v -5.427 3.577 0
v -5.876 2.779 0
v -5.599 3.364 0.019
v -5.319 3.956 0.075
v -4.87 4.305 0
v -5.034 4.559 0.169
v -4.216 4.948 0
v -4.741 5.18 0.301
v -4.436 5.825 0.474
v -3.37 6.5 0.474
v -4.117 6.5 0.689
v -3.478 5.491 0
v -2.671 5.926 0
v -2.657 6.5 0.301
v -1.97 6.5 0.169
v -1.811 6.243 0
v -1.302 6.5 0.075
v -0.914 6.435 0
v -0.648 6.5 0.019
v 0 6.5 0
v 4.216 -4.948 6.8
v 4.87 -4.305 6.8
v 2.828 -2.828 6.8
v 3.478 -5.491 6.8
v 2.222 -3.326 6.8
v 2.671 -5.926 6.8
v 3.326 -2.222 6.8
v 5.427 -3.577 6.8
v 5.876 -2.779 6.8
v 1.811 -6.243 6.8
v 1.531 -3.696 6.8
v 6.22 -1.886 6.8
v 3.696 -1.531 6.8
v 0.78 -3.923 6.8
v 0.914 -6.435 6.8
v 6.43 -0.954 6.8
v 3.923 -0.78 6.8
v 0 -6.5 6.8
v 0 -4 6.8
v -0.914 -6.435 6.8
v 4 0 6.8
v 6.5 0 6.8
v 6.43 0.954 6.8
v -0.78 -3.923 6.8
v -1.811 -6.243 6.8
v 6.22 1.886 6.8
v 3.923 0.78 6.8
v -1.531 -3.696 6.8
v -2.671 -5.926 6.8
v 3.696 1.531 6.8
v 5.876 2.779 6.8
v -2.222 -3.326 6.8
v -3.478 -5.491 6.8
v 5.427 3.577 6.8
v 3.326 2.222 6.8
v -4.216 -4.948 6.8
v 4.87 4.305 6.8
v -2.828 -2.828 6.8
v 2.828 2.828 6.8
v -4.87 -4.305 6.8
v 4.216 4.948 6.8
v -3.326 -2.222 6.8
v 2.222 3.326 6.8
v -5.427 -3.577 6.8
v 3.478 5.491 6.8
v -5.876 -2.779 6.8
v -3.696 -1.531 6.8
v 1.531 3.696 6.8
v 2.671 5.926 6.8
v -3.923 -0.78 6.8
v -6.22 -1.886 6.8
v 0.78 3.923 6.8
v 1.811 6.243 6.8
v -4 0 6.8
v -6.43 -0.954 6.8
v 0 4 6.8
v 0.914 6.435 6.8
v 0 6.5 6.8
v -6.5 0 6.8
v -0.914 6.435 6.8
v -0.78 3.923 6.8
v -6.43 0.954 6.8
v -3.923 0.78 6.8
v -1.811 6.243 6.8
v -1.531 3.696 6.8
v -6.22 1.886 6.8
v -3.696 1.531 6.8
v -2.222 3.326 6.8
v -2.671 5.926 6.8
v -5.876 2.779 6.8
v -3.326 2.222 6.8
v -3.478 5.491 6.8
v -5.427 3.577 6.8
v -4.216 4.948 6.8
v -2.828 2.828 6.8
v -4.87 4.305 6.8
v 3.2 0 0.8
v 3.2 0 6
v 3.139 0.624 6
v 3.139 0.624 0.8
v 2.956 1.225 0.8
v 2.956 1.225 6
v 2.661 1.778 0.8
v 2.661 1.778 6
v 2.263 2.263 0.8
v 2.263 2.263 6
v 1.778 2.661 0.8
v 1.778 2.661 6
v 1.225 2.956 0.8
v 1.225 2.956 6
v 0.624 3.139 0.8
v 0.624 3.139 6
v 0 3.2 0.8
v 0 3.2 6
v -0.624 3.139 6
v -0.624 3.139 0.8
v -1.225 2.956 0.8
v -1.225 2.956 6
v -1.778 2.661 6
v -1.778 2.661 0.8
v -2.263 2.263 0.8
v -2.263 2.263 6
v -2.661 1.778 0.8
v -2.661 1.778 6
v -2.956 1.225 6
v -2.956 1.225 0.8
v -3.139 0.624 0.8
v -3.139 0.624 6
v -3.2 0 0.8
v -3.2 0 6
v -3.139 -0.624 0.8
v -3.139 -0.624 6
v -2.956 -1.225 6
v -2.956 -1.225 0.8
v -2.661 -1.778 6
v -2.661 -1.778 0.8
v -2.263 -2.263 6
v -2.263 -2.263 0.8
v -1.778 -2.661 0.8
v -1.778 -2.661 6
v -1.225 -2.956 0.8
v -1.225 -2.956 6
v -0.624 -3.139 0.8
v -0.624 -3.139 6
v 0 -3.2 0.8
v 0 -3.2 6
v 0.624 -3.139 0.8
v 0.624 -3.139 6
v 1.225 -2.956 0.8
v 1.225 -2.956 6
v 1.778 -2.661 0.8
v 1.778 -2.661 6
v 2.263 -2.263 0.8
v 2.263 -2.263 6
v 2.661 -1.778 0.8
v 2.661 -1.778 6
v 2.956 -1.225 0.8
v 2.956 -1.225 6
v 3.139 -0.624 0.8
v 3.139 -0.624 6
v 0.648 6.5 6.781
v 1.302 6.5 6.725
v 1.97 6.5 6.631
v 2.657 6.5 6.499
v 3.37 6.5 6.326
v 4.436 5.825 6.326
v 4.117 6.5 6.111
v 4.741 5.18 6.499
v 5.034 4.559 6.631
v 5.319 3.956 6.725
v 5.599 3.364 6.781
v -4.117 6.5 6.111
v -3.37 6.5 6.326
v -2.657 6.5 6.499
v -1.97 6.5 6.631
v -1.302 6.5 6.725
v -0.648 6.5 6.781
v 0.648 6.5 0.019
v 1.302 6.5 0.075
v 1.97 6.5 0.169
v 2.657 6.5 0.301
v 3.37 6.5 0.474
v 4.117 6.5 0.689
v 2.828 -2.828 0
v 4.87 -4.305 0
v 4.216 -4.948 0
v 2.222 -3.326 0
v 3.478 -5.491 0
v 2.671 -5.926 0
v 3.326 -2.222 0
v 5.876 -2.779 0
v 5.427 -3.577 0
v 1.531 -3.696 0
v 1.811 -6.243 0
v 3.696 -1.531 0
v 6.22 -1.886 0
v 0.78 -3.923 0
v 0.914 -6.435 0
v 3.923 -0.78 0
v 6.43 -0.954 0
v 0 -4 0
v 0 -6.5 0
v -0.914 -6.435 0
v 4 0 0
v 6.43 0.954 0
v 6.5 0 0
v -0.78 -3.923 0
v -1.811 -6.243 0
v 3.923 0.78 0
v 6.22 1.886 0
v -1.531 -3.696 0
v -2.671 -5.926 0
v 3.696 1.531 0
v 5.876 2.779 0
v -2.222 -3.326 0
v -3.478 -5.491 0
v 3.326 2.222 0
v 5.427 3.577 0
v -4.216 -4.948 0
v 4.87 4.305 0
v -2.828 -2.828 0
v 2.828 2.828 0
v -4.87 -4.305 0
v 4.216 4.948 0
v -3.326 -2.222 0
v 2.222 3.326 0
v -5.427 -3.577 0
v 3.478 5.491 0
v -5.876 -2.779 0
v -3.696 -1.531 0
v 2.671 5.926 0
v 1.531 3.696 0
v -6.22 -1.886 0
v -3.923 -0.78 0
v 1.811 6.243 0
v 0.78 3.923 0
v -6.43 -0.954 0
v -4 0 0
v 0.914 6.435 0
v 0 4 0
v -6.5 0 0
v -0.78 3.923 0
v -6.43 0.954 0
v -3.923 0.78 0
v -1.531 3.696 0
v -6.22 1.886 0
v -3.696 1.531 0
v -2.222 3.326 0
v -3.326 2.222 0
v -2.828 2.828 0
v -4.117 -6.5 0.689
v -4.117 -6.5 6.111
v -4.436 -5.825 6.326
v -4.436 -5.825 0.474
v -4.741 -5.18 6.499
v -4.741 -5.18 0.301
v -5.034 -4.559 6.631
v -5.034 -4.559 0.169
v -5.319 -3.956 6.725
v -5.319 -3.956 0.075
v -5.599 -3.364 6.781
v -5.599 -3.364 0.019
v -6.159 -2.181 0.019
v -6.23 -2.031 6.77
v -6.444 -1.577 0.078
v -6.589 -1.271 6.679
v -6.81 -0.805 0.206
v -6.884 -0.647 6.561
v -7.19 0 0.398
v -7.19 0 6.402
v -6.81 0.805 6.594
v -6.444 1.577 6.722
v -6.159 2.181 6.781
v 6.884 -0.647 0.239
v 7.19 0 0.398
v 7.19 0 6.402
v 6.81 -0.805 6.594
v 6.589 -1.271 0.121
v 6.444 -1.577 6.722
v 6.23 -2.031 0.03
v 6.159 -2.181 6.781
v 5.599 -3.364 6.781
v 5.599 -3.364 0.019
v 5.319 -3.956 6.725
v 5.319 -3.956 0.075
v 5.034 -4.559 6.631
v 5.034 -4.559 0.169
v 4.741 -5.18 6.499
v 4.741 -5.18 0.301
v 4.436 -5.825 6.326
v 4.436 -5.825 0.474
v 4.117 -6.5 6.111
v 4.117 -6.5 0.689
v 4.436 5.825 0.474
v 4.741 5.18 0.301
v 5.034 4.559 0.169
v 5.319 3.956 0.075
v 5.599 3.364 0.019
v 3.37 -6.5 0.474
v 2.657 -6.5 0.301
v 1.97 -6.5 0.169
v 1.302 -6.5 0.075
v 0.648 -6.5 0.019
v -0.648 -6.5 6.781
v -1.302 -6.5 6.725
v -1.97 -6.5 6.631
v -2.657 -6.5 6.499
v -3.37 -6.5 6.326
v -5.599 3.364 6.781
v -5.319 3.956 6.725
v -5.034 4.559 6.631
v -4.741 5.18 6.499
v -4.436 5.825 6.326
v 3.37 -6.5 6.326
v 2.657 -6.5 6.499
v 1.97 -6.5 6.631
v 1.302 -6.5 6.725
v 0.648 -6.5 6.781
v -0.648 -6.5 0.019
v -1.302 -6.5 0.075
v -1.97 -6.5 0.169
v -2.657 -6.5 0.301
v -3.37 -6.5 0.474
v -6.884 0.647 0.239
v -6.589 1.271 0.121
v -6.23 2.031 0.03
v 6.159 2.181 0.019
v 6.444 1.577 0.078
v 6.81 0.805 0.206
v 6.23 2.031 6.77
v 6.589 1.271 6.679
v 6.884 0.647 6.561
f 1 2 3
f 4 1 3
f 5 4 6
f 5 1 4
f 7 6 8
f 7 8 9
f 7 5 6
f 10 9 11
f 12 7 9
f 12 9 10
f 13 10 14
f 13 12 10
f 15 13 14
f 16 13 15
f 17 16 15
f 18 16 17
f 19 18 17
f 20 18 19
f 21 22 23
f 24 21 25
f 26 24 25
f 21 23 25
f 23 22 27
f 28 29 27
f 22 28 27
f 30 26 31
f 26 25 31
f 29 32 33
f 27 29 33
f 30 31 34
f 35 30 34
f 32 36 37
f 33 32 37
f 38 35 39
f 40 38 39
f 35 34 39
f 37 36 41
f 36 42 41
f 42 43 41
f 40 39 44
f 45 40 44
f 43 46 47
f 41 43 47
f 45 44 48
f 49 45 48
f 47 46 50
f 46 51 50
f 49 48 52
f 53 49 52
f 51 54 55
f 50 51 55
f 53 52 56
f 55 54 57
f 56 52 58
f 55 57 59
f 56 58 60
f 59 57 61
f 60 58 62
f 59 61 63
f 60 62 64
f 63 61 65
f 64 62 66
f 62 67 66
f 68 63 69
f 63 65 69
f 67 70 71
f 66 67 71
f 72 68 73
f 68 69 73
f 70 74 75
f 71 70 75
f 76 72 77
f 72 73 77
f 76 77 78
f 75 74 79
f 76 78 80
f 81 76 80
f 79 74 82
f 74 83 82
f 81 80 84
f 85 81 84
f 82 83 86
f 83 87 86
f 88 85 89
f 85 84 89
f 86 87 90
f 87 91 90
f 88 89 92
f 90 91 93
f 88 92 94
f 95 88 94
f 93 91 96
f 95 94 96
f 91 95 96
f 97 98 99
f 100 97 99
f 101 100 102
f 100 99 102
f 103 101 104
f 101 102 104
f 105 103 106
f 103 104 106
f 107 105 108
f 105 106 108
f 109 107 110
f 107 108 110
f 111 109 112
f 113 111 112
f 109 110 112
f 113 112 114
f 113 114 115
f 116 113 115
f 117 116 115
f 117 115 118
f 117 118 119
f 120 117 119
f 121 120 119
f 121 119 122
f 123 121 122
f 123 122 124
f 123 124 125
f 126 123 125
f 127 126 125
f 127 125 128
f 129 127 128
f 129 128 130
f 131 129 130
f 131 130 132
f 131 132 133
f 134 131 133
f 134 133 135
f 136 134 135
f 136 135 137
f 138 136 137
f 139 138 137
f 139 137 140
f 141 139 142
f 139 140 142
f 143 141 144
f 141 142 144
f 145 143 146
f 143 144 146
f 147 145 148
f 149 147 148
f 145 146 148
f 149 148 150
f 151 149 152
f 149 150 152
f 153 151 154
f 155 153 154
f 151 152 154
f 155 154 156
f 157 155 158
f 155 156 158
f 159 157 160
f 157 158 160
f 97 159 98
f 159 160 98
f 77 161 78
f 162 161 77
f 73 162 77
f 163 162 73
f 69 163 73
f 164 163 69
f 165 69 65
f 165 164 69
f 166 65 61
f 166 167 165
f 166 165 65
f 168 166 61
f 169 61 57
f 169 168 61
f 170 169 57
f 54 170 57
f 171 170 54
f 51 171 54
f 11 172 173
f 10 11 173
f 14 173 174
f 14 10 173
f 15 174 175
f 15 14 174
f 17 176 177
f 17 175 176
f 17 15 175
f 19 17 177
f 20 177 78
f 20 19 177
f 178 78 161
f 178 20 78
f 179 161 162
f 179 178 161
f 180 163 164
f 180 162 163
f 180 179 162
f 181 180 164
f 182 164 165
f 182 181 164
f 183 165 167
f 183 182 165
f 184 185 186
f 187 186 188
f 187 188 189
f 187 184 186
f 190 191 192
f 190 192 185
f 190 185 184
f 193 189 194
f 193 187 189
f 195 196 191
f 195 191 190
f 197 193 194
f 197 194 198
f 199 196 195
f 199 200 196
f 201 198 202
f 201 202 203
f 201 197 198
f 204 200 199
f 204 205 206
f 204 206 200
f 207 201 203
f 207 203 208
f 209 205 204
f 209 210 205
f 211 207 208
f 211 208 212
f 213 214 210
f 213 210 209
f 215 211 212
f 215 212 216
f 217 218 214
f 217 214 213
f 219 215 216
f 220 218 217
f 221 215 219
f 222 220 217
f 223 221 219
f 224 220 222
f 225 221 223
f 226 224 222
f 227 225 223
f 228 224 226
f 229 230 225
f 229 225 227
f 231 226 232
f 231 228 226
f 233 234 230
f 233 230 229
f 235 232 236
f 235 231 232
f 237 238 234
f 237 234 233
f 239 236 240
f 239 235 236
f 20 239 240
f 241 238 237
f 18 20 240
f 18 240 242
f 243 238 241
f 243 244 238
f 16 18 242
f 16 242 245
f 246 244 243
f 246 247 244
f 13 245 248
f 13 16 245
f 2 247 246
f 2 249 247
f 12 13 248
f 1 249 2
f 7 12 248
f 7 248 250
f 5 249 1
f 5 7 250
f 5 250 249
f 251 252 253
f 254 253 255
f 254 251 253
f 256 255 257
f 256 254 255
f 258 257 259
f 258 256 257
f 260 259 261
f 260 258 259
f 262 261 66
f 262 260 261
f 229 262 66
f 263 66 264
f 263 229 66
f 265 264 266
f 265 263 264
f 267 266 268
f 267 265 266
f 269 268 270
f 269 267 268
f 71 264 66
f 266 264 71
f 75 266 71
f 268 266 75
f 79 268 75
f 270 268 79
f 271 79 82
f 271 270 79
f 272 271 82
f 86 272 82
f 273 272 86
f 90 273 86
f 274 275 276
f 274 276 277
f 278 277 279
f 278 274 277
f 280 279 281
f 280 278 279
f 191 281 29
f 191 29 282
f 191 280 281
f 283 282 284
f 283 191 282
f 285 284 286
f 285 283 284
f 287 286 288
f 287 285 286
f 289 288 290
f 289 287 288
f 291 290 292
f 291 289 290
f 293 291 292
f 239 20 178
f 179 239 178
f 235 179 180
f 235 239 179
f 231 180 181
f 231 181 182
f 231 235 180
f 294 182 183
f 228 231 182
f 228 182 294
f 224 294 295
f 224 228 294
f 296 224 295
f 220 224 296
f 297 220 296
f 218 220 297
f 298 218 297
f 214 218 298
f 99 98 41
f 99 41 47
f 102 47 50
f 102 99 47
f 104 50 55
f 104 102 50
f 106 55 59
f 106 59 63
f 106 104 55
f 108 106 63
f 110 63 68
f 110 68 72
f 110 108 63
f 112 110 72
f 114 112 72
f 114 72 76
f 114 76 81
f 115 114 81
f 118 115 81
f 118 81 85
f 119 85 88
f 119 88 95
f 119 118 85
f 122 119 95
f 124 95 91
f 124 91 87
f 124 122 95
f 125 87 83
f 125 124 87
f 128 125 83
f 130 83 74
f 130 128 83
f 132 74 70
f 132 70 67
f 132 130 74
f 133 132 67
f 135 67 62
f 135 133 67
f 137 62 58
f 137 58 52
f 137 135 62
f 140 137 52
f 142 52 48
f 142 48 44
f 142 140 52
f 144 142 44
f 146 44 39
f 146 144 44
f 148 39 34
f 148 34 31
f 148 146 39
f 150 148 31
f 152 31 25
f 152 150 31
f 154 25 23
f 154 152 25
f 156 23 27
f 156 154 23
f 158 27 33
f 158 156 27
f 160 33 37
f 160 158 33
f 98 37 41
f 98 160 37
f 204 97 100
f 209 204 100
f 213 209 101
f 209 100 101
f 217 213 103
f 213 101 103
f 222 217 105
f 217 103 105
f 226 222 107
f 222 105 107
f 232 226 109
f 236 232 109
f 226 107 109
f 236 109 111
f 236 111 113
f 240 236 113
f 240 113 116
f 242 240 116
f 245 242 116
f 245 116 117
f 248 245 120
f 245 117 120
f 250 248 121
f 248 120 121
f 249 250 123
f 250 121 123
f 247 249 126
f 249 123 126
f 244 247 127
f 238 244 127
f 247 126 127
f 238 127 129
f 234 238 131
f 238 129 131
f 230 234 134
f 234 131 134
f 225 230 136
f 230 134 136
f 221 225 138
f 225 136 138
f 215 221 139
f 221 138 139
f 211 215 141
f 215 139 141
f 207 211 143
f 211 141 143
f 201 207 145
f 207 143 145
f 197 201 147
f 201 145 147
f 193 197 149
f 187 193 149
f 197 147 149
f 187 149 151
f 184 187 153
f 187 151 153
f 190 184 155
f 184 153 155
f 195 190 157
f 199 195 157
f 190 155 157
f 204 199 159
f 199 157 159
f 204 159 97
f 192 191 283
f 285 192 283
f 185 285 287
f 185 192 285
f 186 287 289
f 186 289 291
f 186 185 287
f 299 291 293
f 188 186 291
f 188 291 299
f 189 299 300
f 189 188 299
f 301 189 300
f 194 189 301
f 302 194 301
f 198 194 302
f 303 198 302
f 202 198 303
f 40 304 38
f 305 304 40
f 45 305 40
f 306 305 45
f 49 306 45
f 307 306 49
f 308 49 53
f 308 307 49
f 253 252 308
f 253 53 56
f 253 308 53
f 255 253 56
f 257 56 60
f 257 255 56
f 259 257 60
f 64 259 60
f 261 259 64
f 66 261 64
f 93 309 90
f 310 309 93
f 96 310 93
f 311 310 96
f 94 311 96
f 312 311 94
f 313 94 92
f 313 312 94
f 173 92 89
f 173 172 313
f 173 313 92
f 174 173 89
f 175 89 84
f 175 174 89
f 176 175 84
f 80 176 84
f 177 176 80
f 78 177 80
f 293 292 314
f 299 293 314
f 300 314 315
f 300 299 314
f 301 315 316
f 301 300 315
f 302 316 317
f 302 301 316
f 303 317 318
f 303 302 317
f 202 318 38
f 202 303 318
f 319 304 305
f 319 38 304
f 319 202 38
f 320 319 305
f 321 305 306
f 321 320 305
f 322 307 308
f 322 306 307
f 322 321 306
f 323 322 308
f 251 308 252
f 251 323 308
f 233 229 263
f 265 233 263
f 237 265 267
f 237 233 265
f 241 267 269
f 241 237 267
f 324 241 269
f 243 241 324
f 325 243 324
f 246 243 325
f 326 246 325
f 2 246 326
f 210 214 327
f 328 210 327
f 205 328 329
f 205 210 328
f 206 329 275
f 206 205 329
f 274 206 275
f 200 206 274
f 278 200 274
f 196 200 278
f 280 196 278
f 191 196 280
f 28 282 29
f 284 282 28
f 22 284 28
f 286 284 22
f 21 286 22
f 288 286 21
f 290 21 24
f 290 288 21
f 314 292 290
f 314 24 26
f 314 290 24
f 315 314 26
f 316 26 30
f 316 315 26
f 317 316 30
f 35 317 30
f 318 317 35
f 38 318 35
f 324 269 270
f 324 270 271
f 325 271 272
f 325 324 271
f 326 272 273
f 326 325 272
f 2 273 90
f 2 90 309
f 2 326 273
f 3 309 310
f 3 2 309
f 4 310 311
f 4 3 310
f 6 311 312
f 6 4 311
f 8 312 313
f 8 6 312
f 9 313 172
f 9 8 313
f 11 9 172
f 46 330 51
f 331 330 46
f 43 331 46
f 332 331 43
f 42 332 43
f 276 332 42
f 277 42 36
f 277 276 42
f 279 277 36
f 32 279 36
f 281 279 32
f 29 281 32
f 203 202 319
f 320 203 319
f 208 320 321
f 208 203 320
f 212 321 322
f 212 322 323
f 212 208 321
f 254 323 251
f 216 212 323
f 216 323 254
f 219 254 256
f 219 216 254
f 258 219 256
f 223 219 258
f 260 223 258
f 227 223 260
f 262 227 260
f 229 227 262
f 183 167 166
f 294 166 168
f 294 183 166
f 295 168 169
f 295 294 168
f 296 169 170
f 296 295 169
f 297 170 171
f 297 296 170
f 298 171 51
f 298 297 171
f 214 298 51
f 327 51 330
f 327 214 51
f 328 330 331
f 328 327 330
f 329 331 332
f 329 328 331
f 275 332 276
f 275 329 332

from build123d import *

# Parameters (mm, degrees)
BASE_EXTRUSION_DEPTH    = 6.8
ESQUISSE4_R             = 3.2
ENL_V_MAT_EXTRU_1_DEPTH = 12.840021115
CHANFREIN1_SIZE         = 0.8


with BuildPart() as part:
    # Esquisse1 → Base-Extrusion (new body)
    with BuildSketch(Plane.XY):
        Polygon((-7.19, 0), (-4.116549171, 6.5), (4.116549171, 6.5), (7.19, 0), (4.116549171, -6.5), (-4.116549171, -6.5), align=None)
    extrude(amount=BASE_EXTRUSION_DEPTH)

    # Esquisse3 → Enlever de la matière-Révolution1 (revolve, cut)
    with BuildSketch(Plane(origin=(0, 0, 0), x_dir=(0, 0, -1), z_dir=(1, 0, 0)), mode=Mode.PRIVATE) as enlever_de_la_mati_re_r_volution1_sk:
        Polygon((-6.8, 6.5), (-3.4, 12.388972746), (0, 6.5), (2.598076211, 8), (-3.4, 18.388972746), (-9.398076211, 8), align=None)
    revolve(enlever_de_la_mati_re_r_volution1_sk.sketch.rotate(Axis((0, 0, 8.495961775), (0, 0, -1)), 90), axis=Axis((0, 0, 8.495961775), (0, 0, -1)), mode=Mode.SUBTRACT)

    # Esquisse4 → Enlèv. mat.-Extru.1 (cut, through all)
    with BuildSketch(Plane.XY.offset(6.8)):
        Circle(ESQUISSE4_R)
    extrude(amount=-ENL_V_MAT_EXTRU_1_DEPTH, mode=Mode.SUBTRACT)

    # Chanfrein1
    chanfrein1_edges = [part.edges().sort_by_distance(p)[0] for p in [
        (-3.2, 0, 0),
        (-3.2, 0, 6.8),
    ]]
    chamfer(chanfrein1_edges, length=CHANFREIN1_SIZE)


solid = part.part
